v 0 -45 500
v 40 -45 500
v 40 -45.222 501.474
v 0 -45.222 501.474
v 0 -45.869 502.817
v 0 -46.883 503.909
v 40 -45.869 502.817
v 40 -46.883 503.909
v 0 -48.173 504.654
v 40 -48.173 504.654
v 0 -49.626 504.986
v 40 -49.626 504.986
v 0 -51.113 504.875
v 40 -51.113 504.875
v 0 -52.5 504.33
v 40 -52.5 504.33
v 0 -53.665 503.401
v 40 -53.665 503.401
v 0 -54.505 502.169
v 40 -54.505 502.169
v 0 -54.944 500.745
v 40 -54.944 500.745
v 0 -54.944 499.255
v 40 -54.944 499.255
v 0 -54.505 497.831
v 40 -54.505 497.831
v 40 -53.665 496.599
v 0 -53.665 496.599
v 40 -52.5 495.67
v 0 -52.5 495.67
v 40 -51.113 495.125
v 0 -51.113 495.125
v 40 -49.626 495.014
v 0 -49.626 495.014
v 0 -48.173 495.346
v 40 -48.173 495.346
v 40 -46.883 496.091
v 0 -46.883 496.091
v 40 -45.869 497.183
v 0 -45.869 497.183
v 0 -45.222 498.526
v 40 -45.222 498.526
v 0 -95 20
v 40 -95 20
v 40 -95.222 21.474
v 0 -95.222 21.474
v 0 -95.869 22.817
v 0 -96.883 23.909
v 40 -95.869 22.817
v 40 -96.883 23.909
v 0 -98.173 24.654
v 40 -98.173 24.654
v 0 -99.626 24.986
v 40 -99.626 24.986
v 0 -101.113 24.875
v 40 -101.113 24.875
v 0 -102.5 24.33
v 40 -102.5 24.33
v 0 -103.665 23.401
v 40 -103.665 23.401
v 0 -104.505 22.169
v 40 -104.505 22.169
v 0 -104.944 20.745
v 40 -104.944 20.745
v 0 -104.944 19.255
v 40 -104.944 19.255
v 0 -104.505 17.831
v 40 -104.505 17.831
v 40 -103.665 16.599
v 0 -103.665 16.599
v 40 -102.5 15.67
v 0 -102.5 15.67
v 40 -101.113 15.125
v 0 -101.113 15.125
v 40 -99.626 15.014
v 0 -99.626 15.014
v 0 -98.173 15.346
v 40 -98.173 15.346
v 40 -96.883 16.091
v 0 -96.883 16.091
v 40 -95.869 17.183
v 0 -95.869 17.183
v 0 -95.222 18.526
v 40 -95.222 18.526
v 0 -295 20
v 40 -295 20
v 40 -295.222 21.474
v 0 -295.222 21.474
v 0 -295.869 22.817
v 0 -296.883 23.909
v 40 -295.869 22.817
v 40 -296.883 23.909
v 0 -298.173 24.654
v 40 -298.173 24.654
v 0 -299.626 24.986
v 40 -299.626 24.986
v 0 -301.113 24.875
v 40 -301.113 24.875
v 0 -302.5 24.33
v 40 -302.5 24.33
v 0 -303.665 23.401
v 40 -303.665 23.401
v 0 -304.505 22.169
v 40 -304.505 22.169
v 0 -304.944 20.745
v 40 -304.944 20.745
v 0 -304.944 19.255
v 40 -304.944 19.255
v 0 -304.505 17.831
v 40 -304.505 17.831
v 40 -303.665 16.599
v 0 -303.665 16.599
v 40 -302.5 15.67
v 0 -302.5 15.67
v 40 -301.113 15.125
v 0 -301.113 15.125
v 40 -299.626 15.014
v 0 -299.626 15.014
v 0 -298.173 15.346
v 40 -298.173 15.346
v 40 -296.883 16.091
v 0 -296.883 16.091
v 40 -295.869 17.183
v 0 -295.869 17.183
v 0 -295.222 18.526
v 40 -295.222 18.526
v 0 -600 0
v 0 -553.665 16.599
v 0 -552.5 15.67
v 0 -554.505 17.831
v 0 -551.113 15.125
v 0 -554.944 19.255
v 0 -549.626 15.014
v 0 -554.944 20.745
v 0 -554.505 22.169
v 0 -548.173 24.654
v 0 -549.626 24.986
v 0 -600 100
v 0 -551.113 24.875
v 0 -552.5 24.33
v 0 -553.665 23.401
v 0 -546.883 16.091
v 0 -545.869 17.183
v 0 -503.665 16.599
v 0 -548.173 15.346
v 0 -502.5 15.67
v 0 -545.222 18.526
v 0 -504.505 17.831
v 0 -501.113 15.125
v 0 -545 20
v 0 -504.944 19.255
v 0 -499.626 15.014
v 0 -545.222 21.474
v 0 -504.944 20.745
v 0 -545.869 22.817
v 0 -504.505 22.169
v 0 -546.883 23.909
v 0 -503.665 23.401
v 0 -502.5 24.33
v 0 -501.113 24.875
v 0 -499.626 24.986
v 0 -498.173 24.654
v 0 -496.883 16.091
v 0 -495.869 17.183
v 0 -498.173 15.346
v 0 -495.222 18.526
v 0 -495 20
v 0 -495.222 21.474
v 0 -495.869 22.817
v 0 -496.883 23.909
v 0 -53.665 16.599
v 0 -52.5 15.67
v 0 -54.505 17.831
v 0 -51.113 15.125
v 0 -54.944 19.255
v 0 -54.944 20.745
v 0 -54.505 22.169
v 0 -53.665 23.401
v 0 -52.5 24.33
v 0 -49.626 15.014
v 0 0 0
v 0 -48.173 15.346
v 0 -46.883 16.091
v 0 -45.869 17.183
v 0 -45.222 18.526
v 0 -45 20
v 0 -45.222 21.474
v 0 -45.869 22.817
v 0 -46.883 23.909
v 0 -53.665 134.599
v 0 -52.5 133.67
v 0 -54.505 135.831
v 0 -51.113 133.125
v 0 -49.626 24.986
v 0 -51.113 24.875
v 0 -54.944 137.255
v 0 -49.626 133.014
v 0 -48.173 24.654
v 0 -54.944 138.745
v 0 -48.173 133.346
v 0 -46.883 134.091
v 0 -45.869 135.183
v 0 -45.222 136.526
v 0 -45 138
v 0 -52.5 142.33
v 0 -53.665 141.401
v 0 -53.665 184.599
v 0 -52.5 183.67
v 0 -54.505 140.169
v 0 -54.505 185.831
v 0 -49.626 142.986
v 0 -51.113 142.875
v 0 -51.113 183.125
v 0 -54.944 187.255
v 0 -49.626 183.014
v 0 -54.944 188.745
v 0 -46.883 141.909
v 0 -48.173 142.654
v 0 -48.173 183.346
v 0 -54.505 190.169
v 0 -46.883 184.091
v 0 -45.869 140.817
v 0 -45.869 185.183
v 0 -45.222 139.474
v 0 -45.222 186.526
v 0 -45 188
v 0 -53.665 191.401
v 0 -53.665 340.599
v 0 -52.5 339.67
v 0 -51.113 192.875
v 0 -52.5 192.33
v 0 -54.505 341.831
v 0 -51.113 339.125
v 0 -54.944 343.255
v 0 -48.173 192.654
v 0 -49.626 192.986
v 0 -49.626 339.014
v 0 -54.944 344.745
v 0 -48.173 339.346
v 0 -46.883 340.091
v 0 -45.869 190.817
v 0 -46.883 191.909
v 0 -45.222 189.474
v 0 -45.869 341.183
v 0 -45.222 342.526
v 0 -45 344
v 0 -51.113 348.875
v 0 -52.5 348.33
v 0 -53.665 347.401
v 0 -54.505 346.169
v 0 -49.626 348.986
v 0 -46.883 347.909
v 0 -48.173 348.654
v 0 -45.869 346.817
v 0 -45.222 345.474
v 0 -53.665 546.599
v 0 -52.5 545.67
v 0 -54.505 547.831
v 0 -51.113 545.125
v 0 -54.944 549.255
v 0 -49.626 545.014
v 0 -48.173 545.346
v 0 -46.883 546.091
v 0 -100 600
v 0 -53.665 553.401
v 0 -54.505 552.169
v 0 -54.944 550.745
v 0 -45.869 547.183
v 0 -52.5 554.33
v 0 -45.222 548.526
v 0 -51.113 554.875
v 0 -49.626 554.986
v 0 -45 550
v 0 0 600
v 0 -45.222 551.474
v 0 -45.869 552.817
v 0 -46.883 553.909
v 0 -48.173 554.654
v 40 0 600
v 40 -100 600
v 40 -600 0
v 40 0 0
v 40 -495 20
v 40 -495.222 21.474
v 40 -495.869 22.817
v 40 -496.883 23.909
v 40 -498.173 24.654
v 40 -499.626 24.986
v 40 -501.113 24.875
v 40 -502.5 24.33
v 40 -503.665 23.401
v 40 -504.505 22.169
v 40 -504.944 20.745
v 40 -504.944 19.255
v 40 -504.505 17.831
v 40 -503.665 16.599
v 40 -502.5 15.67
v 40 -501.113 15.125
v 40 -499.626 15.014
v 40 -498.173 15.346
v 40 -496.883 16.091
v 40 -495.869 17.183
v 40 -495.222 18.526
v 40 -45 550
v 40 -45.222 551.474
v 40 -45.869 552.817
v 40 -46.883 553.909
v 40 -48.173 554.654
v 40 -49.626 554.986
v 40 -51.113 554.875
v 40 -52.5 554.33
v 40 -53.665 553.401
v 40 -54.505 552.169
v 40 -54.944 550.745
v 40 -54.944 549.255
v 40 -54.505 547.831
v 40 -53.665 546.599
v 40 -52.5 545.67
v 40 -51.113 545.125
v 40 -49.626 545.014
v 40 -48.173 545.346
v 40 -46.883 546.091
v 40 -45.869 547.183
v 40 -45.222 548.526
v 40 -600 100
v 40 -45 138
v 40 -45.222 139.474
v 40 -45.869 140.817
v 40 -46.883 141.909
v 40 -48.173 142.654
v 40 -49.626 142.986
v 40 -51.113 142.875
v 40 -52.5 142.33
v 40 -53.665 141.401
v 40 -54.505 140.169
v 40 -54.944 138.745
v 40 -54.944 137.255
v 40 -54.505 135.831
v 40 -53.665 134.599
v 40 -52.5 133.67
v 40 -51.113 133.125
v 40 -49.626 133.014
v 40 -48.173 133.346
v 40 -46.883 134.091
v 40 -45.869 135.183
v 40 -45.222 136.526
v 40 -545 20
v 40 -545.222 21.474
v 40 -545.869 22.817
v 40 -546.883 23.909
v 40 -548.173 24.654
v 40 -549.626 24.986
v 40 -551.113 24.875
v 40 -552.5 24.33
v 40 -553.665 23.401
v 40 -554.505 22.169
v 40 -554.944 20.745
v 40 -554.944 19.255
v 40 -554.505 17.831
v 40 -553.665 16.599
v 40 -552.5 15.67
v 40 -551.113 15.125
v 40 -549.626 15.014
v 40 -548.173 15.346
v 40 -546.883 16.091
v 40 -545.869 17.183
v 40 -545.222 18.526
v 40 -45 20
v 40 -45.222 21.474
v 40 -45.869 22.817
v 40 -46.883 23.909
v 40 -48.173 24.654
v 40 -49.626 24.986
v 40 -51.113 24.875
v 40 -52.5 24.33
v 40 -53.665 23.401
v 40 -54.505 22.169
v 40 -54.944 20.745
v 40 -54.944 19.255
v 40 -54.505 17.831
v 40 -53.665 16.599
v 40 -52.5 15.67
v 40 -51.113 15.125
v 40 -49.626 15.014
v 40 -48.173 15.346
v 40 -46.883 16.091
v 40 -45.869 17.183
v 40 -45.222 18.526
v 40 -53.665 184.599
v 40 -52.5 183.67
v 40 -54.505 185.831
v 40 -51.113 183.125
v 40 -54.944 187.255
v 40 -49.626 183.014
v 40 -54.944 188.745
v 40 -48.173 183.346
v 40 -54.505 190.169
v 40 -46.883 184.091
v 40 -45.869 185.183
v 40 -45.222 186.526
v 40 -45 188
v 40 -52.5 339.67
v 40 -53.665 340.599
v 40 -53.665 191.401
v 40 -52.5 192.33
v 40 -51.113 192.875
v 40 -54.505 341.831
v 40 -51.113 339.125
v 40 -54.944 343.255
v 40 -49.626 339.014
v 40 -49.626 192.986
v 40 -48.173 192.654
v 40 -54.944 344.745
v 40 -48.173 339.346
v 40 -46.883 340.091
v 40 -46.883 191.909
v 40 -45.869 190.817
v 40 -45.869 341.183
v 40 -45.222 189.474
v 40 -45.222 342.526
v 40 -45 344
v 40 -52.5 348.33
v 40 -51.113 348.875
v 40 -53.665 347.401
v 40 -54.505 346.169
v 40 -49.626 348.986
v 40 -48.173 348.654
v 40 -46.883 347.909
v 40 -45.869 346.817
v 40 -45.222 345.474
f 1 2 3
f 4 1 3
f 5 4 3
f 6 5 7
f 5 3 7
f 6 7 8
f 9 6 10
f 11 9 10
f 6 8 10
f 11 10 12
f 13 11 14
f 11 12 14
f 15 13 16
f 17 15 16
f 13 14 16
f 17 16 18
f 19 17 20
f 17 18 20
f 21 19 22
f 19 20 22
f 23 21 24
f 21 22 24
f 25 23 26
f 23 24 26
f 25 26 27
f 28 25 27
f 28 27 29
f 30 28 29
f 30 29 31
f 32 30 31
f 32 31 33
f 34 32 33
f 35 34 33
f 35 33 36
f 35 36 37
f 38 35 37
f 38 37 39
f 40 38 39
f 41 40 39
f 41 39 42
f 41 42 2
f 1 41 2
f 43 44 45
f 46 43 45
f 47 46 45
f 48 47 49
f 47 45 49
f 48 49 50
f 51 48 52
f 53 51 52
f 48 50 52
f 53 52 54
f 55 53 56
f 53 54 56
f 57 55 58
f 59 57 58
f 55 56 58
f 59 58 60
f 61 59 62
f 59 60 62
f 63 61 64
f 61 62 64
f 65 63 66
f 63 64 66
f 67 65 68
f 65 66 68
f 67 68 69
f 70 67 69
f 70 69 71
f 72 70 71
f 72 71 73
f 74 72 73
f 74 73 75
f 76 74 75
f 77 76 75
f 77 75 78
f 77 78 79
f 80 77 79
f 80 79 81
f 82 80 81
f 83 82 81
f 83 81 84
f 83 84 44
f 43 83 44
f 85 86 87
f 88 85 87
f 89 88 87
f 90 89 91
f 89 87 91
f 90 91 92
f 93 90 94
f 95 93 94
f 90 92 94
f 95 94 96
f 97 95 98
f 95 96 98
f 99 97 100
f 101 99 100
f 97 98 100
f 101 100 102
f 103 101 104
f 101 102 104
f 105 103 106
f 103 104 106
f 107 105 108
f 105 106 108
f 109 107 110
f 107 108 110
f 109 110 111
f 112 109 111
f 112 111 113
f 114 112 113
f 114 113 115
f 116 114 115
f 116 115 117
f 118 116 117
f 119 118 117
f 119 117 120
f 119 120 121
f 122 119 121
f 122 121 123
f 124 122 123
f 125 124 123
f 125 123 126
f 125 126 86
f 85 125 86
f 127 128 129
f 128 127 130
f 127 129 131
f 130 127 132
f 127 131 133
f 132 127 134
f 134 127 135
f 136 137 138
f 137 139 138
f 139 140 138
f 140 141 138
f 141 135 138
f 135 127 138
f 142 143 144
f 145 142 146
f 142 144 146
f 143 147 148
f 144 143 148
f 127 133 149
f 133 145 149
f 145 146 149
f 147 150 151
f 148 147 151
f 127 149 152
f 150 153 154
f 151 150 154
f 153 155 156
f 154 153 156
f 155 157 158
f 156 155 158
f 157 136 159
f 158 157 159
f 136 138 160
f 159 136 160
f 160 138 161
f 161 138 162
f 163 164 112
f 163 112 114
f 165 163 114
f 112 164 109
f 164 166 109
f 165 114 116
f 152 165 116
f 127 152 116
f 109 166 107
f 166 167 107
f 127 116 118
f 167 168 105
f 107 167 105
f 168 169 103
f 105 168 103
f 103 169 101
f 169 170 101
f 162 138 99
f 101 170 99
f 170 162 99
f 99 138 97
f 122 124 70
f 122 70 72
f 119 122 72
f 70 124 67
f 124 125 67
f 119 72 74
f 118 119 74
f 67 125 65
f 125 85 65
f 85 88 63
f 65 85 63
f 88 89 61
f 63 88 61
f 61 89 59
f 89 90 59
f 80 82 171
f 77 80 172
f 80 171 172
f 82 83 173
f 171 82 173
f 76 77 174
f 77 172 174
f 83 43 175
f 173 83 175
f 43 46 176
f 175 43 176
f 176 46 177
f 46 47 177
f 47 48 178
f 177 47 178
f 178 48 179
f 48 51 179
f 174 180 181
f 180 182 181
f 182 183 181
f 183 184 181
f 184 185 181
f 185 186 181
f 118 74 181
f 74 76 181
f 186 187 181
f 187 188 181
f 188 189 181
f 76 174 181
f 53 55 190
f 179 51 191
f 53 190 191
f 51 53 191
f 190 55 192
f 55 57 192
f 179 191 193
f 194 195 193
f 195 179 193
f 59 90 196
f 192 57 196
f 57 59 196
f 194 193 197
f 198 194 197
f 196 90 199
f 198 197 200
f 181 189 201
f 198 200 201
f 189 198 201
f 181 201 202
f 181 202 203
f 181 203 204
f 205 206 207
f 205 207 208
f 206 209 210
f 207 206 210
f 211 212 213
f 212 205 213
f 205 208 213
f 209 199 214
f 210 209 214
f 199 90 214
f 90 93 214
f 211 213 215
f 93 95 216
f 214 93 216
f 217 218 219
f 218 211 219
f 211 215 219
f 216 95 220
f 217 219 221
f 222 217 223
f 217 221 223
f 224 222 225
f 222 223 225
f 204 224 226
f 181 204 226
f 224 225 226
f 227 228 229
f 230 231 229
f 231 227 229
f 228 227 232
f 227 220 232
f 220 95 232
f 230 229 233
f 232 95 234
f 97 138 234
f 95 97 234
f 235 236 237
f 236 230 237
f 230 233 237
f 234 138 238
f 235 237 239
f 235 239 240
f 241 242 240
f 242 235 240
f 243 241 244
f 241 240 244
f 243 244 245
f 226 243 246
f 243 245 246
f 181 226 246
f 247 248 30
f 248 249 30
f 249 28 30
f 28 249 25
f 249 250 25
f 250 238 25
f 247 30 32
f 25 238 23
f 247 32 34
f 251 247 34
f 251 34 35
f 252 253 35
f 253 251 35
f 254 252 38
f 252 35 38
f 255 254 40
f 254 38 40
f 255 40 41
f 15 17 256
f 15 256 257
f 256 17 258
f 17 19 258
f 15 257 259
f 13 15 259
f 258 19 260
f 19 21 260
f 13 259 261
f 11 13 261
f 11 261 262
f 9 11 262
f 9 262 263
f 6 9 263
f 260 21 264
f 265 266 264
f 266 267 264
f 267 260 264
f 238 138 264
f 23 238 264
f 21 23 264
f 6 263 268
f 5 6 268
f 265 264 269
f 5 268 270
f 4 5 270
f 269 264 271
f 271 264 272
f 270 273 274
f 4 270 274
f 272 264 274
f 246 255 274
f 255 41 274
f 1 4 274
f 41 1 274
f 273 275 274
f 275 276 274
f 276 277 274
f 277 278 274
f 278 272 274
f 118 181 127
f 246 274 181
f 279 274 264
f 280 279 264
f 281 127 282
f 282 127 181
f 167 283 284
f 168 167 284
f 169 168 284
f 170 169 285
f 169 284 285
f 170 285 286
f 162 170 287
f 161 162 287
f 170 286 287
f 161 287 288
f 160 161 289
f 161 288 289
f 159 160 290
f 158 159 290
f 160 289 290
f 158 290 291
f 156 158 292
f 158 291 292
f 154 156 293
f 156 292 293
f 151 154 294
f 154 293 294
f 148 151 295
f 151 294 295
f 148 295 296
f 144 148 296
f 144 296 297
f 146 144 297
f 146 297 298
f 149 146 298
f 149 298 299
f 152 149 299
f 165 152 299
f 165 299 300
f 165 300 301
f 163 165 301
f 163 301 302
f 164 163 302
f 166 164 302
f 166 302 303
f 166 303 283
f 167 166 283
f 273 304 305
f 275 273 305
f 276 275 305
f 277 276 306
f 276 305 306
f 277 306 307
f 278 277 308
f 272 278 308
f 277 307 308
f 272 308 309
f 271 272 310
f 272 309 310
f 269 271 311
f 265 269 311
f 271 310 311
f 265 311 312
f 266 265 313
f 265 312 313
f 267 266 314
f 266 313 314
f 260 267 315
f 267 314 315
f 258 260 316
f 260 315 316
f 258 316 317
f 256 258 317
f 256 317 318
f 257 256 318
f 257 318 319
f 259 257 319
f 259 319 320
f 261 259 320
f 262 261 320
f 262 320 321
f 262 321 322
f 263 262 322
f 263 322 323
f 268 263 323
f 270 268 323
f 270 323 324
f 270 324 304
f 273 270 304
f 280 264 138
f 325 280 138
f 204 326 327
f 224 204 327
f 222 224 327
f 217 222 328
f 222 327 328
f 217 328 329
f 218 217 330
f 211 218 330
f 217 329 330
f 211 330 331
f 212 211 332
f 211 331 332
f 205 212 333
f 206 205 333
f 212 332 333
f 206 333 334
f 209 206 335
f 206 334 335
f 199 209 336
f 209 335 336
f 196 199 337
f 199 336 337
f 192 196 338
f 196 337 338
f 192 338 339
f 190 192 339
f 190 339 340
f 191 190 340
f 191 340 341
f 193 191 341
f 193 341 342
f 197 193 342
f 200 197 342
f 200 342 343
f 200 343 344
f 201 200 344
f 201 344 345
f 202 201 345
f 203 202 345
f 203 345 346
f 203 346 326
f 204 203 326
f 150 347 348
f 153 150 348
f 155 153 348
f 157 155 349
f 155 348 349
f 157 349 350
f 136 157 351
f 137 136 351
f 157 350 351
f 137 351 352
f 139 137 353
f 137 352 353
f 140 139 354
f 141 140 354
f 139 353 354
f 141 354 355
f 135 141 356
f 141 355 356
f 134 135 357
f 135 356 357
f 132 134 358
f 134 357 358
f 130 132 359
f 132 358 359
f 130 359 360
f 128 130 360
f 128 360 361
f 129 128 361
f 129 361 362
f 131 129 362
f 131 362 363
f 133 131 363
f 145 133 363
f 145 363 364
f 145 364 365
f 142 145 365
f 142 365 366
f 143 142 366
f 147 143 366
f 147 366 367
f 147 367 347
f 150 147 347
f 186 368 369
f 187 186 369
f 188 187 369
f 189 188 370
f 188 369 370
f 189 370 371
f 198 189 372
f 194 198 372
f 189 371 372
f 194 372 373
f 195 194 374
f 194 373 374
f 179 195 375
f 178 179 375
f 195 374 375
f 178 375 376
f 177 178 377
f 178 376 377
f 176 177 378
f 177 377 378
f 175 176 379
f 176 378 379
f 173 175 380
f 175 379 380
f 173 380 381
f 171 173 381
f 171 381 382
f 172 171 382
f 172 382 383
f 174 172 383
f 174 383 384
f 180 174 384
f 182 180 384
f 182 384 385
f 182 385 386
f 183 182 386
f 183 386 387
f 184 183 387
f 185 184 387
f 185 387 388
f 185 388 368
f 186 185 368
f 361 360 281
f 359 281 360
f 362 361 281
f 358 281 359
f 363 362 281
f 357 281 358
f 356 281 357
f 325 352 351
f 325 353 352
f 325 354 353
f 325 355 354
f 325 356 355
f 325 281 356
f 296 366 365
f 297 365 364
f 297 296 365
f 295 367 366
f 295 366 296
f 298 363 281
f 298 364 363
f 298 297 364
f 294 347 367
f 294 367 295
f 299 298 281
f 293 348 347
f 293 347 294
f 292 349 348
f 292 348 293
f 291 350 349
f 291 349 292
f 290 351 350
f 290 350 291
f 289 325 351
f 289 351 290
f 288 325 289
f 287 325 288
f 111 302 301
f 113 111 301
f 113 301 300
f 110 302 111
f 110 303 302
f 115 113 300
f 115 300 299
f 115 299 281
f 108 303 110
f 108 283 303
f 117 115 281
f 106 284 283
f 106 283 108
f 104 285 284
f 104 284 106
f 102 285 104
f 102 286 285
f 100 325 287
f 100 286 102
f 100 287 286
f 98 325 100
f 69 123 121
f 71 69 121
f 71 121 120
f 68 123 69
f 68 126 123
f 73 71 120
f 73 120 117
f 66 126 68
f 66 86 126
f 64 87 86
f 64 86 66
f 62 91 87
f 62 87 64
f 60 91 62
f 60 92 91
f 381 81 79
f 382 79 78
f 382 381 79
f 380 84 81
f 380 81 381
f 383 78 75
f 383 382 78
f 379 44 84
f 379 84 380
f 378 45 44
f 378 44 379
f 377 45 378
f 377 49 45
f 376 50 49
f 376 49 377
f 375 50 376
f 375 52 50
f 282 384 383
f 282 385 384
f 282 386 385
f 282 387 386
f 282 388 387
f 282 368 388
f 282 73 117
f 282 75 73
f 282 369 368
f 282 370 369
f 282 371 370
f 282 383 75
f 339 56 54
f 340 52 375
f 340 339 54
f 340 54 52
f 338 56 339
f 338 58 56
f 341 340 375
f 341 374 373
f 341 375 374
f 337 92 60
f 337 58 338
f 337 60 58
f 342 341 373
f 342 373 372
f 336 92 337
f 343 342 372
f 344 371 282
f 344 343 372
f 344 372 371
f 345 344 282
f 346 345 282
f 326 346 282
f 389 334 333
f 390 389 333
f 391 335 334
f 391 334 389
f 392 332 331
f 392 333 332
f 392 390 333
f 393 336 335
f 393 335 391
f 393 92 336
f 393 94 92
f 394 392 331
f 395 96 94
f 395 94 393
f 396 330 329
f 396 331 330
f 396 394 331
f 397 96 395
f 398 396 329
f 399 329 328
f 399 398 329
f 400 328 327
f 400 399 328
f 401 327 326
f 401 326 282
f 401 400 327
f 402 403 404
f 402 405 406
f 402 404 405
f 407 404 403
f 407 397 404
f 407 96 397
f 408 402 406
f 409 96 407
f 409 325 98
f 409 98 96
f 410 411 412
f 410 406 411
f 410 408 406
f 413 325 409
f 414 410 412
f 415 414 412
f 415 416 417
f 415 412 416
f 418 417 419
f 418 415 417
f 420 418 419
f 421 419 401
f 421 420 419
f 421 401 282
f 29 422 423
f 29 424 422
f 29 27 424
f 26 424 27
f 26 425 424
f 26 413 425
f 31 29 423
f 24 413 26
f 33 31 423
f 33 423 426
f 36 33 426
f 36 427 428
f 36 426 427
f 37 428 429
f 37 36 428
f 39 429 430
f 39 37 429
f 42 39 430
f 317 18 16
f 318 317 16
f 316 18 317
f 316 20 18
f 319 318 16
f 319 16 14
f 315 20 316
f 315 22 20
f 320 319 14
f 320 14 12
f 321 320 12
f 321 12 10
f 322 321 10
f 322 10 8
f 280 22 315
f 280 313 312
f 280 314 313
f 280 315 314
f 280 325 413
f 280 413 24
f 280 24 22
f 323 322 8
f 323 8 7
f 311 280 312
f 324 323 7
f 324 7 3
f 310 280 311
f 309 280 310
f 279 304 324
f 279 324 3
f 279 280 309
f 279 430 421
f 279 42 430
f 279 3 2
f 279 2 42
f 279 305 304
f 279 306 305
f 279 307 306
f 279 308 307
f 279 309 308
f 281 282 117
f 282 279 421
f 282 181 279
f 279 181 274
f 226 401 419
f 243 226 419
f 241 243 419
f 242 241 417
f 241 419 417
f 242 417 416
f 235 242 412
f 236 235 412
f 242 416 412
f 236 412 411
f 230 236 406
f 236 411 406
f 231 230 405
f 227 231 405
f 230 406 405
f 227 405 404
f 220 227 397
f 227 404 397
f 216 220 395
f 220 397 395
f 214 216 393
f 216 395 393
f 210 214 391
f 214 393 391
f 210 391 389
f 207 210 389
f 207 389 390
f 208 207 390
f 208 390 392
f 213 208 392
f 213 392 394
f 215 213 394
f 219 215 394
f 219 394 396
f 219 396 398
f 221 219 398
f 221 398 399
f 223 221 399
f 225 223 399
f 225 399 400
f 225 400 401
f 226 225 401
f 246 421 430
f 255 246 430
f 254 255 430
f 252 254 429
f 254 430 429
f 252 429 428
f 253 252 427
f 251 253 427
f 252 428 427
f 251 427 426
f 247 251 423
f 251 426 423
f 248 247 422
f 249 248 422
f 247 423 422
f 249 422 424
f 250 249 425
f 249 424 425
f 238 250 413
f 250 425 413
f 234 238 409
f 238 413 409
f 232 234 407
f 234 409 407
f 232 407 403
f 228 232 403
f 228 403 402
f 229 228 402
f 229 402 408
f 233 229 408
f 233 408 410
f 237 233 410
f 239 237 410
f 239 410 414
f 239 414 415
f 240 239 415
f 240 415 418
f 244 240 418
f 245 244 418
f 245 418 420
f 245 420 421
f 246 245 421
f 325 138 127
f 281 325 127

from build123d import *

# Parameters (mm, degrees)
F1_DEPTH = 40
F4_D     = 10


with BuildPart() as f1:
    # F0 (on Right) → F1 (new body)
    with BuildSketch(Plane.YZ):
        Polygon((-600, 0), (0, 0), (0, 600), (-100, 600), (-600, 100), align=None)
    extrude(amount=F1_DEPTH)

    # F4 (through all)
    with Locations(Plane(origin=(0, 0, 0), x_dir=(0, -1, 0), z_dir=(-1, 0, 0))):
        with Locations((50, 20), (100, 20), (300, 20), (500, 20), (550, 20), (50, 138), (50, 188), (50, 344), (50, 500), (50, 550)):
            Hole(F4_D / 2)


solid = f1.part
